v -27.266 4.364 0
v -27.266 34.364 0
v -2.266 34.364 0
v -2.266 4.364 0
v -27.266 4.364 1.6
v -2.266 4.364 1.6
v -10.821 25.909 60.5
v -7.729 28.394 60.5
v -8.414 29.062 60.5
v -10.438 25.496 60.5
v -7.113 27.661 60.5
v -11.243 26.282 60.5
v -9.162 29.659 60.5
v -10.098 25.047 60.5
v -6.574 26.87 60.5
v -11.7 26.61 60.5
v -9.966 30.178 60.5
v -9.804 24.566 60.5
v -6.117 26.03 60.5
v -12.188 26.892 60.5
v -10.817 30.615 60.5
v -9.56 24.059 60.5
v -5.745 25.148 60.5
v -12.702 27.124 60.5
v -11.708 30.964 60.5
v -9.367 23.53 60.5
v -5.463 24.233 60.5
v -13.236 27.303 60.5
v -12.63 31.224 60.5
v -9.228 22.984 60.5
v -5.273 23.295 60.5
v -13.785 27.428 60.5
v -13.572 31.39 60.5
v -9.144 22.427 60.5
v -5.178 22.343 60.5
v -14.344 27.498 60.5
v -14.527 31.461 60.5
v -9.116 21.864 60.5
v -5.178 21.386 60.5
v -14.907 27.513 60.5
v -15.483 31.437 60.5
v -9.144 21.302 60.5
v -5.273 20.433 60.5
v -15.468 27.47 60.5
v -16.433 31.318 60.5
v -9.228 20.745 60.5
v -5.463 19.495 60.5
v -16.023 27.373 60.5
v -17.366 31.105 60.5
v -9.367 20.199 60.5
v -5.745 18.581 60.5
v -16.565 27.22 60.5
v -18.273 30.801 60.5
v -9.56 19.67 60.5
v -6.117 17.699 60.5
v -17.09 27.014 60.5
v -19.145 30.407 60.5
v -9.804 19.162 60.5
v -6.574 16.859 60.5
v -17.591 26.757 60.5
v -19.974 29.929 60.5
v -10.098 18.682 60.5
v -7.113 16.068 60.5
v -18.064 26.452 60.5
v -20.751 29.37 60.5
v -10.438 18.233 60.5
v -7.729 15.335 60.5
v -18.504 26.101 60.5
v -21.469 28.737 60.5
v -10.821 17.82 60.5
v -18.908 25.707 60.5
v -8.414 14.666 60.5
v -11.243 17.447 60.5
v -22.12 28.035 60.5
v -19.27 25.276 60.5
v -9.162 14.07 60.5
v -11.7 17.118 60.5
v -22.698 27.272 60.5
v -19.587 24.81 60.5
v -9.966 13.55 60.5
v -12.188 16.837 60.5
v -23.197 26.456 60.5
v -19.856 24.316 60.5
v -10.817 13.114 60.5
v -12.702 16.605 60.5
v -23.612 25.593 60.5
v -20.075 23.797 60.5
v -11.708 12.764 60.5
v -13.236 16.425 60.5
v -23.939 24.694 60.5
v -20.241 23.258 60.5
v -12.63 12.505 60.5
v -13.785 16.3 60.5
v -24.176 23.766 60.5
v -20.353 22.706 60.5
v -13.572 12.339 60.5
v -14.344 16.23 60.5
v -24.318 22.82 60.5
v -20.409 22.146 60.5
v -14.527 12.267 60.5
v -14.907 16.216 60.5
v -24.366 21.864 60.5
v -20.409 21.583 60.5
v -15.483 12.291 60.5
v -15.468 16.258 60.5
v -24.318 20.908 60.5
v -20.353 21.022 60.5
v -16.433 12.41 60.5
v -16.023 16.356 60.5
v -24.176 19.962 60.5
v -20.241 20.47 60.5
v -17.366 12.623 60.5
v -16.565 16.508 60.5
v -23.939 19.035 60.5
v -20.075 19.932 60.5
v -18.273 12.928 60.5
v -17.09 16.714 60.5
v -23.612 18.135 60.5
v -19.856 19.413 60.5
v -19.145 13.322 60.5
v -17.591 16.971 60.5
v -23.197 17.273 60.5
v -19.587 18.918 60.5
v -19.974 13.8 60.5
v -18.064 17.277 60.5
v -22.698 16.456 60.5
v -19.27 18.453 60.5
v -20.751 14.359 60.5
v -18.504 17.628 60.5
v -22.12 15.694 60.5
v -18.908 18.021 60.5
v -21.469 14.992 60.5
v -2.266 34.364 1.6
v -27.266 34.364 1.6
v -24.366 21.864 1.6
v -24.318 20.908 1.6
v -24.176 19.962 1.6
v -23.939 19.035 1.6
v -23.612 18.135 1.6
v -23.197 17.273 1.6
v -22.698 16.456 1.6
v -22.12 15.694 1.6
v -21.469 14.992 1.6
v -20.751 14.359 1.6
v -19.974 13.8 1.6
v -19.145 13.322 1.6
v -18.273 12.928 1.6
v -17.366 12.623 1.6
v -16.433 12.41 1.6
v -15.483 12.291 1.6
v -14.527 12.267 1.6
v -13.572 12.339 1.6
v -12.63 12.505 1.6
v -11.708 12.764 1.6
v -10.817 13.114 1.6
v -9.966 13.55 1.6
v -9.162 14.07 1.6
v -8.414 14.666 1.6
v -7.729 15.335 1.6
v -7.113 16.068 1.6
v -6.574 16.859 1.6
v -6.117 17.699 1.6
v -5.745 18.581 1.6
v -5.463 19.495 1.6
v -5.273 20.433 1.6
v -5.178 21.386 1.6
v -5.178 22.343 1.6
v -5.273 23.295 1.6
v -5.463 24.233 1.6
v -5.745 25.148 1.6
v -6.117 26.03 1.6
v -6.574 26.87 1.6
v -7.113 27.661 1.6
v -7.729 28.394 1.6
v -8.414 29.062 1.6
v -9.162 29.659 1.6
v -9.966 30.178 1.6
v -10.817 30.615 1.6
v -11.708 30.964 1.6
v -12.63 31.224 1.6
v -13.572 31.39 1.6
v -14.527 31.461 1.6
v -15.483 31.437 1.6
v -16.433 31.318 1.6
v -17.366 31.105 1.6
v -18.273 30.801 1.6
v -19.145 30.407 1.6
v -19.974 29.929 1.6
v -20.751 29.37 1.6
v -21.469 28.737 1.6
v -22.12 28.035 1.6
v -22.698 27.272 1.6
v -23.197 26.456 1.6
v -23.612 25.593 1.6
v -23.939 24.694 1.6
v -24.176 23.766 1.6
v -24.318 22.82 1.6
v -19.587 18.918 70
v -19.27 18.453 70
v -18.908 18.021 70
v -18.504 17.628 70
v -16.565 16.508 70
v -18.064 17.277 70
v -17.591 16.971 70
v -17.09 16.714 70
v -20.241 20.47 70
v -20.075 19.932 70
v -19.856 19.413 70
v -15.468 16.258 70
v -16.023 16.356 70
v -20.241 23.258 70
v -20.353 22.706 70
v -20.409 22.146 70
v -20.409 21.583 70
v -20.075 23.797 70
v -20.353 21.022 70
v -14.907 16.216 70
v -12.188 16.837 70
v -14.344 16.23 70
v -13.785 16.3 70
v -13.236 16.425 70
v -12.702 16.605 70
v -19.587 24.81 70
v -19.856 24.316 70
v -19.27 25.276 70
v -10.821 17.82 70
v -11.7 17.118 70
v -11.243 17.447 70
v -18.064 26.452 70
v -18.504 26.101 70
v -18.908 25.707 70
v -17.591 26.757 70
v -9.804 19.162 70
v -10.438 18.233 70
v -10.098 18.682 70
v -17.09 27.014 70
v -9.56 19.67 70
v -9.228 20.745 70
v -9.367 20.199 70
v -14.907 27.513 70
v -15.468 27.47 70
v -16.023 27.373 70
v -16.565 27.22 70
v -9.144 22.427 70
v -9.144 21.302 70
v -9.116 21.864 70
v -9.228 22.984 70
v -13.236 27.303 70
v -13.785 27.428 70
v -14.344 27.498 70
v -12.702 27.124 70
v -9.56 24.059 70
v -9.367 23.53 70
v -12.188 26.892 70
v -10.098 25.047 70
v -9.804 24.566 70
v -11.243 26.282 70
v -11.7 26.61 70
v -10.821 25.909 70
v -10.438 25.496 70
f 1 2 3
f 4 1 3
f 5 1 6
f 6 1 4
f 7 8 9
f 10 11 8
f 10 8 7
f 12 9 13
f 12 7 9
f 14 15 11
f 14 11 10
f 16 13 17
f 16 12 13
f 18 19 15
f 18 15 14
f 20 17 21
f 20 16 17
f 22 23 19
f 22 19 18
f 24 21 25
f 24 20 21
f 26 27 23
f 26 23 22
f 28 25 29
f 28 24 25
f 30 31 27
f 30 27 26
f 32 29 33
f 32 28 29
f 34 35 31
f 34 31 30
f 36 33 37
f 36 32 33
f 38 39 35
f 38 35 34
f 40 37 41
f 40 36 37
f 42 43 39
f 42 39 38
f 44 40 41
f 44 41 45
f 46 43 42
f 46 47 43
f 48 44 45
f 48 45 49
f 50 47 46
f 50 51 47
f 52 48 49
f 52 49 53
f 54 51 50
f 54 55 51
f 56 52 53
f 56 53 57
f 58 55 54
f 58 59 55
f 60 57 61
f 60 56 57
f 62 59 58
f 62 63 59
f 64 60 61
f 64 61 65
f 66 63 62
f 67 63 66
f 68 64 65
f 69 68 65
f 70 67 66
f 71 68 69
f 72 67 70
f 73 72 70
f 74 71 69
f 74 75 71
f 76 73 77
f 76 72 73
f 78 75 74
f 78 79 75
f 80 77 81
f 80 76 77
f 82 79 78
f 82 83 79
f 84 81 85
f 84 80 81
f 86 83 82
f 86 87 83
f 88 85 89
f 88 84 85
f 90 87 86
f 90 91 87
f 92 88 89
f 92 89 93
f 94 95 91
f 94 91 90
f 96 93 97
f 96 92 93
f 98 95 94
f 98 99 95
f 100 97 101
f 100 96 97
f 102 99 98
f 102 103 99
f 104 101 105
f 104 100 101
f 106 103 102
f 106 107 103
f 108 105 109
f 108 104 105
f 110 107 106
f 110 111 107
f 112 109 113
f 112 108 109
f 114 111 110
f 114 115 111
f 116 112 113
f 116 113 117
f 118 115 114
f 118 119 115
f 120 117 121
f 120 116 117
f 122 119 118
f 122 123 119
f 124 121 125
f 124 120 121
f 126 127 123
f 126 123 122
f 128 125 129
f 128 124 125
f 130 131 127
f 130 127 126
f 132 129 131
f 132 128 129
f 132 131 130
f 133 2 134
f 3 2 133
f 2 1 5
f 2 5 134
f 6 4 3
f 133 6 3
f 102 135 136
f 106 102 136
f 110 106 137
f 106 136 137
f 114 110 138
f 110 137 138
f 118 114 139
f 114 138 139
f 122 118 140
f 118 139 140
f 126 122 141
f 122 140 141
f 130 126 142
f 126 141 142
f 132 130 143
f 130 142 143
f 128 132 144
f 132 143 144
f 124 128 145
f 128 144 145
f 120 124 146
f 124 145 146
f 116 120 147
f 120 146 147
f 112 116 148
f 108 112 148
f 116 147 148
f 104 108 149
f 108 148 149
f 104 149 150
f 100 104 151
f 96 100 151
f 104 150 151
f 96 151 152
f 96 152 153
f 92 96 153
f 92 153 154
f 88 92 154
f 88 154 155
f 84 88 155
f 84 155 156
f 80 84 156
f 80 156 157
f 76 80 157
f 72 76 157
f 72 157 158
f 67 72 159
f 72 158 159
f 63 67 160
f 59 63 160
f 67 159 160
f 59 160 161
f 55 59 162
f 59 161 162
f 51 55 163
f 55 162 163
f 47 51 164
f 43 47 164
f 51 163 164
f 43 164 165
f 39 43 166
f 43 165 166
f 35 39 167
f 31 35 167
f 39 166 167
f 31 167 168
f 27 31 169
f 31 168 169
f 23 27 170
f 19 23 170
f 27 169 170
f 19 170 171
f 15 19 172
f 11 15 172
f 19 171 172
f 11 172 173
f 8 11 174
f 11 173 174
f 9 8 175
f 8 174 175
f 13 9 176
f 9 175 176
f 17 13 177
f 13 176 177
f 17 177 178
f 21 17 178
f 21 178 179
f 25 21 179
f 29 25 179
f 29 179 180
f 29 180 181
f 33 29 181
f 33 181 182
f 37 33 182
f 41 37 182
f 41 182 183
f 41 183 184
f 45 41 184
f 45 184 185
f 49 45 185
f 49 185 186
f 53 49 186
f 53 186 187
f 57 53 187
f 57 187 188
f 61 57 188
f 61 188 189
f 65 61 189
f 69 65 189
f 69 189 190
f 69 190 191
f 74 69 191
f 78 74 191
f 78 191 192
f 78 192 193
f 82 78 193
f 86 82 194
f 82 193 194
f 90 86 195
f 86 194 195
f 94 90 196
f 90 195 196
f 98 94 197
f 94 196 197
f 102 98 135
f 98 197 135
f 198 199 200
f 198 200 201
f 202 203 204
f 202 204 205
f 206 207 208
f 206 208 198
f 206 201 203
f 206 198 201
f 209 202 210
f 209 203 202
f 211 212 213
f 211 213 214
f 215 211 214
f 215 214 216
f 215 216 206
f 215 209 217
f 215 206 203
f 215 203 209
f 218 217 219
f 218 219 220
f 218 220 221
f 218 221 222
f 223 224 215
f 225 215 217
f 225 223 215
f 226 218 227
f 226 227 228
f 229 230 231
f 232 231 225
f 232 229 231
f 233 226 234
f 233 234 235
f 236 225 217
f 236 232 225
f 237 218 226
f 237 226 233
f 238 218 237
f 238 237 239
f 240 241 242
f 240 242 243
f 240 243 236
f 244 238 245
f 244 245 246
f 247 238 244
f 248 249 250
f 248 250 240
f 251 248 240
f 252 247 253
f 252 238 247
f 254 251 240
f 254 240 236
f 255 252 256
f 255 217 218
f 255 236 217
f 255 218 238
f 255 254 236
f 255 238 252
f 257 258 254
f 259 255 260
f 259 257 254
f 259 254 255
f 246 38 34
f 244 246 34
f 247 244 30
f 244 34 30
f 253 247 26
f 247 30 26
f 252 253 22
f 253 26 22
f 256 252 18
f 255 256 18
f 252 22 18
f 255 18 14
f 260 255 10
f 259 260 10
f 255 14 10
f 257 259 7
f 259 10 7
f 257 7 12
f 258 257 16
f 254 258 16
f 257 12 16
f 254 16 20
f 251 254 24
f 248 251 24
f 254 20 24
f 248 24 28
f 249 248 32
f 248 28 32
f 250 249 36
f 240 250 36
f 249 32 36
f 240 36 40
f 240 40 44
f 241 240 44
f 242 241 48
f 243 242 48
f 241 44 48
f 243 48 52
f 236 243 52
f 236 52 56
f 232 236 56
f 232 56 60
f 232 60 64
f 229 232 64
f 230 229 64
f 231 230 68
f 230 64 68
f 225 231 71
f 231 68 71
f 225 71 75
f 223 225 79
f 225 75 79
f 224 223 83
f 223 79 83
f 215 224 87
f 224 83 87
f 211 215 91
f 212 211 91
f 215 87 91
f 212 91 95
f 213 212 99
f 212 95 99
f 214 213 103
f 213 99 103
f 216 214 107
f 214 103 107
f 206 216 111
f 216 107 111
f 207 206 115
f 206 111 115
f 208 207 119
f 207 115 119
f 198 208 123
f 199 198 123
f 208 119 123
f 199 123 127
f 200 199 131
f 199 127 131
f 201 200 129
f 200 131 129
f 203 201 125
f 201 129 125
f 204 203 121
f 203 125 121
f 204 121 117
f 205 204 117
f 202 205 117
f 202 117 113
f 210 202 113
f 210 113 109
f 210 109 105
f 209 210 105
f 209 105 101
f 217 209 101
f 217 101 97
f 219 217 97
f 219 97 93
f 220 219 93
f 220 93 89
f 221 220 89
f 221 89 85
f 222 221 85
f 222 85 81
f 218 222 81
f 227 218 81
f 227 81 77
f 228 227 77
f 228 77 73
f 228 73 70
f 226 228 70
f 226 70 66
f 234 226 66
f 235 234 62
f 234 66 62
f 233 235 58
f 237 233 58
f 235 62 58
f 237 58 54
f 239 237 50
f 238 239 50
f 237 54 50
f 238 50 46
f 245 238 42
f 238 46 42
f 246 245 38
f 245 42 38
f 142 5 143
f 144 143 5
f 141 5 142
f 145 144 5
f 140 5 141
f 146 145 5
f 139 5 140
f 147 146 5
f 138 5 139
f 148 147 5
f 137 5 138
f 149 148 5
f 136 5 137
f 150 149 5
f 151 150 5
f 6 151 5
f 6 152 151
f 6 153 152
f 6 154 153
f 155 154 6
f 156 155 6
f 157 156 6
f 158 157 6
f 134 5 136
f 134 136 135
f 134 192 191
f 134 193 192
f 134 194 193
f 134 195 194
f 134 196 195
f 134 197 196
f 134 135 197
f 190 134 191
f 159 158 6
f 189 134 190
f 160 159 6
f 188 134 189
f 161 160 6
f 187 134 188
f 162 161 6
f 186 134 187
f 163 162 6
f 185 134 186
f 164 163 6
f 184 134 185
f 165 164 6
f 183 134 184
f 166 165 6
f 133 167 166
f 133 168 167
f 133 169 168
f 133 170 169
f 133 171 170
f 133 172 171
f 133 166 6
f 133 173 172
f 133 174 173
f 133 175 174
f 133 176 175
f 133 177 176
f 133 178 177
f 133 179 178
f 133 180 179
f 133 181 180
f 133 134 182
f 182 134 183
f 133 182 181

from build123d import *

# Parameters (mm, degrees)
SKETCH_1_W      = 25
SKETCH_1_H      = 30
EXTRUDE_1_DEPTH = 1.6
SKETCH_2_R      = 9.6
EXTRUDE_2_DEPTH = 58.9
SKETCH_4_R      = 5.65
EXTRUDE_3_DEPTH = 9.5


with BuildPart() as part:
    # ｽｹｯﾁ1 → ﾎﾞｽ - 押し出し1 (new body)
    with BuildSketch(Plane.XY):
        with Locations((-14.765846009, 19.364285714)):
            Rectangle(SKETCH_1_W, SKETCH_1_H)
    extrude(amount=EXTRUDE_1_DEPTH)

    # ｽｹｯﾁ2 → ﾎﾞｽ - 押し出し2 (add)
    with BuildSketch(Plane.XY.offset(1.6)):
        with Locations(Location((-14.765846009, 21.864285714, 0), (0, 0, 180))):
            Circle(SKETCH_2_R)
    extrude(amount=EXTRUDE_2_DEPTH)

    # ｽｹｯﾁ4 → ﾎﾞｽ - 押し出し3 (add)
    with BuildSketch(Plane.XY.offset(60.5)):
        with Locations((-14.765846009, 21.864285714)):
            Circle(SKETCH_4_R)
    extrude(amount=EXTRUDE_3_DEPTH)


solid = part.part
